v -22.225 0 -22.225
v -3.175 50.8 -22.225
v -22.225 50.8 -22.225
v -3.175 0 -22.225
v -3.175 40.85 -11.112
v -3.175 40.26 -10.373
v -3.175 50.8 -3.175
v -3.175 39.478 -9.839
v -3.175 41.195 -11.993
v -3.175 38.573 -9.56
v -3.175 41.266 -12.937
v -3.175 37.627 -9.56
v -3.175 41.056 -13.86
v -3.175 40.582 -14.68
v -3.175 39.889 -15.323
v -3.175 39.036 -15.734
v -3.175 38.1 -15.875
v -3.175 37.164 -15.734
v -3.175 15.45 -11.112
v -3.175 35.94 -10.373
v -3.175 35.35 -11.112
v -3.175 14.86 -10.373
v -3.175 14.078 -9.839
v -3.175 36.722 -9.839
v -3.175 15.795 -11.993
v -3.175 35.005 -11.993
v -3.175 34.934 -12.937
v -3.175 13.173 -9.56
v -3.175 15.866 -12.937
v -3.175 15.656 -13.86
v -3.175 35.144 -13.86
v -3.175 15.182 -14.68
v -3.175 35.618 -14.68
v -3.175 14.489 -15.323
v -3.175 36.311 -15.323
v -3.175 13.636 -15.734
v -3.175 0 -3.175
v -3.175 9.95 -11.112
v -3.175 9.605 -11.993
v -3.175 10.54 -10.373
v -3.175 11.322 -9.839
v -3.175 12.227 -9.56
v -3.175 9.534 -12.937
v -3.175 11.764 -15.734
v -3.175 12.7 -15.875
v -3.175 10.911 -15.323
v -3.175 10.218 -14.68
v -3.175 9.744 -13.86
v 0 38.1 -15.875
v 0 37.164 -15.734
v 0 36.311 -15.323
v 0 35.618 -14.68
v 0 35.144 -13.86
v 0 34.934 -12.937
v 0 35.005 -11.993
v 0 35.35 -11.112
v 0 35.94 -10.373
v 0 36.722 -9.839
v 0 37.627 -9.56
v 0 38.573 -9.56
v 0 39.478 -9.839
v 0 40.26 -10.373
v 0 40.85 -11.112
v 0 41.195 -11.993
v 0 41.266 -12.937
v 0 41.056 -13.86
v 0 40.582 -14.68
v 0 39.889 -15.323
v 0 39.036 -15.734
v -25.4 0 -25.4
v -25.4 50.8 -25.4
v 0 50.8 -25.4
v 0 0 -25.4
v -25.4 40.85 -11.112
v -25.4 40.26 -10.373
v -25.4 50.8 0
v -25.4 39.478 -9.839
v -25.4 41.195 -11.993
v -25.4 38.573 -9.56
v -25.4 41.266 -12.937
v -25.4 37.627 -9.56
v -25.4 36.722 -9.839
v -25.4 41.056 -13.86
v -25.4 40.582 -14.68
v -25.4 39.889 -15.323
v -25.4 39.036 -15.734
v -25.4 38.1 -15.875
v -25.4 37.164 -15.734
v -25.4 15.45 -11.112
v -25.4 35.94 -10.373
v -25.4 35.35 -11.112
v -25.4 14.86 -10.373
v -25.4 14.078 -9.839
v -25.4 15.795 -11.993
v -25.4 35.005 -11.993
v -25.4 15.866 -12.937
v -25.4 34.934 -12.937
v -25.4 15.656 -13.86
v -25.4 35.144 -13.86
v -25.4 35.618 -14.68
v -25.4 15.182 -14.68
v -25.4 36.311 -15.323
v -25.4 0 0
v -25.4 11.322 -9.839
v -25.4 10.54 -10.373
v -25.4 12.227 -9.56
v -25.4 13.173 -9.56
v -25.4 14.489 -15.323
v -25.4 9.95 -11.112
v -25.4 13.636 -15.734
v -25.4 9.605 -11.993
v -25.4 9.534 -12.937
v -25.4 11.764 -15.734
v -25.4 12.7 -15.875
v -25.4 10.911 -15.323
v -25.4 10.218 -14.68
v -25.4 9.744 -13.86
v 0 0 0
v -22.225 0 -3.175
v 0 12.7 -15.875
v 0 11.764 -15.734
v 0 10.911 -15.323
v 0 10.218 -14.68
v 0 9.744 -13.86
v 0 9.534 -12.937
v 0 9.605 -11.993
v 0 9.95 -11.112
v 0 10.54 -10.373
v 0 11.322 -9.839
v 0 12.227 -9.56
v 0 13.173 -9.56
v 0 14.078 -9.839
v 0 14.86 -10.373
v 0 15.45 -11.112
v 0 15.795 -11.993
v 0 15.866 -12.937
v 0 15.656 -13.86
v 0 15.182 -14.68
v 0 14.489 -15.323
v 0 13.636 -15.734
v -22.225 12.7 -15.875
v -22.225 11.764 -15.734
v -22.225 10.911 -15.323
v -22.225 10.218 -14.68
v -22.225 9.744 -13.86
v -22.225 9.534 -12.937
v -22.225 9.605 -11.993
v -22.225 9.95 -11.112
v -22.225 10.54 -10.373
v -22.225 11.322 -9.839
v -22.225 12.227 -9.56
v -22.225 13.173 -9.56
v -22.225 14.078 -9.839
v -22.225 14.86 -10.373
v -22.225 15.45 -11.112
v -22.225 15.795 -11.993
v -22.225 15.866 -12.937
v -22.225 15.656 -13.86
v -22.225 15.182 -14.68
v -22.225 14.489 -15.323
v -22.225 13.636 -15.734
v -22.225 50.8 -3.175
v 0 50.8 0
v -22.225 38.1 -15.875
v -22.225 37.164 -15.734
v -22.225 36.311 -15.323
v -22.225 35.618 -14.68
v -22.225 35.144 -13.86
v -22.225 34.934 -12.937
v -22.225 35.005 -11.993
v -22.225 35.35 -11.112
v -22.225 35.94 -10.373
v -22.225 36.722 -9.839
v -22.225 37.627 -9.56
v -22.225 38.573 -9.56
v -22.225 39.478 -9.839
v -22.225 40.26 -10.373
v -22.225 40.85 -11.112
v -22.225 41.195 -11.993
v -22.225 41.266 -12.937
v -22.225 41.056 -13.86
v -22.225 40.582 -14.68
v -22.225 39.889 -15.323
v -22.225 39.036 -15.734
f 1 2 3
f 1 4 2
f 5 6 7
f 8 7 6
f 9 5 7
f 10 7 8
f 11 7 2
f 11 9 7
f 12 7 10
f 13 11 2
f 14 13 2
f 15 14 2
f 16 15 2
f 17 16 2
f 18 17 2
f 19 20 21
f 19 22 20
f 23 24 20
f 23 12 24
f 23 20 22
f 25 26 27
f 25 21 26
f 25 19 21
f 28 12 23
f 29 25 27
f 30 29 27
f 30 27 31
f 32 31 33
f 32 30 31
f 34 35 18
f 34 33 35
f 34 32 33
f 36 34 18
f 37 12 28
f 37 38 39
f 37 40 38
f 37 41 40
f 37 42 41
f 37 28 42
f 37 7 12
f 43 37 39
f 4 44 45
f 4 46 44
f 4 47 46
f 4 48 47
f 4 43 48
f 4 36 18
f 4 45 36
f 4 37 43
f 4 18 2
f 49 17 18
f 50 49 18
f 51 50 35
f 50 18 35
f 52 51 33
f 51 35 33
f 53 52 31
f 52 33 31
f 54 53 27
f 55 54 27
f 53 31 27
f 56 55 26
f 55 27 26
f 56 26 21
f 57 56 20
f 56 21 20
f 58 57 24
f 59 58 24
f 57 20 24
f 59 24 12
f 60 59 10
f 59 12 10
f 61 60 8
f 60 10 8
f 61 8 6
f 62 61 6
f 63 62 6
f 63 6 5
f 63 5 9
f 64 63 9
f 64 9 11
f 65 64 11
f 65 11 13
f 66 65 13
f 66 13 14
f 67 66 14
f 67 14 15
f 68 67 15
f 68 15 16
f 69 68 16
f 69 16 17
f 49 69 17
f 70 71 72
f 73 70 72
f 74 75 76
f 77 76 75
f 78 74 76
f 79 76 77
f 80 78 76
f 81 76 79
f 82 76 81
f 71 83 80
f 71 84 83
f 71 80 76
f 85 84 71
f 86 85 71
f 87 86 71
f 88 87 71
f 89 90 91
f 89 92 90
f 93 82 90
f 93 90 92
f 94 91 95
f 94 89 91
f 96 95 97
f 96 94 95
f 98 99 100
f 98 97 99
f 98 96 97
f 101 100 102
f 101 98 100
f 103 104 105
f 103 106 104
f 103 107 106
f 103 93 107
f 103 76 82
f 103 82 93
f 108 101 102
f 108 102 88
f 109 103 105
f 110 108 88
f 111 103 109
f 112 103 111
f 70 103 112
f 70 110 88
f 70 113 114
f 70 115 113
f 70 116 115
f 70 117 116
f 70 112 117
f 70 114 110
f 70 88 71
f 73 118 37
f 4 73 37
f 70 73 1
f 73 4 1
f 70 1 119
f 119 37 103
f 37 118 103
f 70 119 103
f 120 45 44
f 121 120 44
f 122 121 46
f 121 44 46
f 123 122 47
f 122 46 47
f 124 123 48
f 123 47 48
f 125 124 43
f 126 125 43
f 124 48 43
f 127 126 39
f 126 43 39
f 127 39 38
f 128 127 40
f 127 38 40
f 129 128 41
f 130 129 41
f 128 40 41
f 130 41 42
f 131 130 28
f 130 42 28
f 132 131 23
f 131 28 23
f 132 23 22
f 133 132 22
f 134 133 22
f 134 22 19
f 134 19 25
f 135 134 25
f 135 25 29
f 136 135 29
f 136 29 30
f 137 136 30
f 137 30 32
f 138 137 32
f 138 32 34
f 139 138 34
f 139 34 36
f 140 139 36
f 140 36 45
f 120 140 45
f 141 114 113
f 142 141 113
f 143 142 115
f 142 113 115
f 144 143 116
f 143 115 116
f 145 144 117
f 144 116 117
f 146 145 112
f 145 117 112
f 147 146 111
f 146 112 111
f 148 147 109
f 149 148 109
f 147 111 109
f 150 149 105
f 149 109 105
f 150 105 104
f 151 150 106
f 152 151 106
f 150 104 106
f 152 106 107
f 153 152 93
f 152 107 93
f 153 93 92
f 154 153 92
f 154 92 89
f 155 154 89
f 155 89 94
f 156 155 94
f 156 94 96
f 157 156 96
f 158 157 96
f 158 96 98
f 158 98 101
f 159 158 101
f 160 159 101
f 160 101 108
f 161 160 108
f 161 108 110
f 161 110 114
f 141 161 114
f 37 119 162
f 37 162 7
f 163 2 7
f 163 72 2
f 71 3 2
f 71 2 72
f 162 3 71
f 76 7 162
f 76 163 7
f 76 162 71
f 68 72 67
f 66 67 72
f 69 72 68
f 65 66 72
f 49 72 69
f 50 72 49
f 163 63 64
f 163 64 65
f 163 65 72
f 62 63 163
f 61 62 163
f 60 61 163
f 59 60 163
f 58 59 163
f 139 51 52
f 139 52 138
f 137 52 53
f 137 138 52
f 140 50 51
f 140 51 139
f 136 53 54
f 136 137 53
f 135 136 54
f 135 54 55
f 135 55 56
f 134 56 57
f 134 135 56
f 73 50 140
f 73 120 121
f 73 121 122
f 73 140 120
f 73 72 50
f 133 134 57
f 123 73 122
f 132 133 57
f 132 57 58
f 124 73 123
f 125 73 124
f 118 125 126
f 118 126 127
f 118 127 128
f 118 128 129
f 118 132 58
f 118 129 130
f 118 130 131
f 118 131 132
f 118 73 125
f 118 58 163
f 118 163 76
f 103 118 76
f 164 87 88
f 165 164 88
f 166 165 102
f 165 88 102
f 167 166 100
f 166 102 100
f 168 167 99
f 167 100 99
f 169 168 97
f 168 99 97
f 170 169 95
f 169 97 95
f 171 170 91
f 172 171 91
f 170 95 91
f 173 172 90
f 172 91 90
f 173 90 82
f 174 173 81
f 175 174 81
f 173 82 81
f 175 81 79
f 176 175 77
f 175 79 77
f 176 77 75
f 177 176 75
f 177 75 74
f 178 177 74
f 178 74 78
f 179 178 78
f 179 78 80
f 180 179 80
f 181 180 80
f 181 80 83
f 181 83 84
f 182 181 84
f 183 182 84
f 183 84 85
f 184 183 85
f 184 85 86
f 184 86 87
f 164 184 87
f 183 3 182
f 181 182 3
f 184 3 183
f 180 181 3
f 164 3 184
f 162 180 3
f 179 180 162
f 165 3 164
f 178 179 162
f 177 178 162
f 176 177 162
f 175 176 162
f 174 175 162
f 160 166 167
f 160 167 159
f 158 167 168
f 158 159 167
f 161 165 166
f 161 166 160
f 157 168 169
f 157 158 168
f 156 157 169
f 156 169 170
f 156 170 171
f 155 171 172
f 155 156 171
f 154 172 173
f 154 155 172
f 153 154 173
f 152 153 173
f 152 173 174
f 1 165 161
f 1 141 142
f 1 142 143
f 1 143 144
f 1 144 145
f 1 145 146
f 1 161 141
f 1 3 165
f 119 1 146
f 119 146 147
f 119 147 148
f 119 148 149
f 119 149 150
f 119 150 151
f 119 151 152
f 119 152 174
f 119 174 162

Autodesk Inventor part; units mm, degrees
ref_plane "YZ Plane" through (0, 0, 0) normal (1, 0, 0) x (0, 1, 0)
ref_plane "XZ Plane" through (0, 0, 0) normal (0, 1, 0) x (-1, 0, 0)
ref_plane "XY Plane" through (0, 0, 0) normal (0, 0, 1) x (1, 0, 0)
sketch "Sketch1" plane through (0, 0, 0) normal (0, 1, 0) x (-1, 0, 0)
  line L0 (0, 0) -> (25.4, 0)
  line L1 (25.4, 0) -> (25.4, -25.4)
  line L2 (25.4, -25.4) -> (0, -25.4)
  line L3 (0, -25.4) -> (0, 0)
  line L4 (22.225, -22.225) -> (22.225, -3.175)
  line L5 (22.225, -3.175) -> (3.175, -3.175)
  line L6 (3.175, -3.175) -> (3.175, -22.225)
  line L7 (3.175, -22.225) -> (22.225, -22.225)
  dimension "d0" = 25.4
  dimension "d1" = 25.4
  dimension "d2" = 3.175
extrude "Extrusion1" add sketch "Sketch1" along normal blind 50.8
sketch "Sketch2" plane through (0, 0, 0) normal (1, 0, 0) x (0, 0, -1)
  line L0 (25.4, 0) -> (0, 0) projected
  line L1 (25.4, 0) -> (25.4, 50.8) projected
  line L2 (0, 50.8) -> (25.4, 50.8) projected
  line L3 (0, 0) -> (0, 50.8) projected
  point P0 (12.7, 38.1)
  point P1 (12.7, 12.7)
  dimension "d5" = 12.7
  dimension "d6" = 12.7
  dimension "d7" = 12.7
  dimension "d8" = 12.7
hole "Hole1" at (0, 38.1, -12.7) at (0, 12.7, -12.7) direction (-1, 0, 0) diameter 6.35 end through all
properties part number "1x1AluminumStandoff.ver1-1111-2020"
